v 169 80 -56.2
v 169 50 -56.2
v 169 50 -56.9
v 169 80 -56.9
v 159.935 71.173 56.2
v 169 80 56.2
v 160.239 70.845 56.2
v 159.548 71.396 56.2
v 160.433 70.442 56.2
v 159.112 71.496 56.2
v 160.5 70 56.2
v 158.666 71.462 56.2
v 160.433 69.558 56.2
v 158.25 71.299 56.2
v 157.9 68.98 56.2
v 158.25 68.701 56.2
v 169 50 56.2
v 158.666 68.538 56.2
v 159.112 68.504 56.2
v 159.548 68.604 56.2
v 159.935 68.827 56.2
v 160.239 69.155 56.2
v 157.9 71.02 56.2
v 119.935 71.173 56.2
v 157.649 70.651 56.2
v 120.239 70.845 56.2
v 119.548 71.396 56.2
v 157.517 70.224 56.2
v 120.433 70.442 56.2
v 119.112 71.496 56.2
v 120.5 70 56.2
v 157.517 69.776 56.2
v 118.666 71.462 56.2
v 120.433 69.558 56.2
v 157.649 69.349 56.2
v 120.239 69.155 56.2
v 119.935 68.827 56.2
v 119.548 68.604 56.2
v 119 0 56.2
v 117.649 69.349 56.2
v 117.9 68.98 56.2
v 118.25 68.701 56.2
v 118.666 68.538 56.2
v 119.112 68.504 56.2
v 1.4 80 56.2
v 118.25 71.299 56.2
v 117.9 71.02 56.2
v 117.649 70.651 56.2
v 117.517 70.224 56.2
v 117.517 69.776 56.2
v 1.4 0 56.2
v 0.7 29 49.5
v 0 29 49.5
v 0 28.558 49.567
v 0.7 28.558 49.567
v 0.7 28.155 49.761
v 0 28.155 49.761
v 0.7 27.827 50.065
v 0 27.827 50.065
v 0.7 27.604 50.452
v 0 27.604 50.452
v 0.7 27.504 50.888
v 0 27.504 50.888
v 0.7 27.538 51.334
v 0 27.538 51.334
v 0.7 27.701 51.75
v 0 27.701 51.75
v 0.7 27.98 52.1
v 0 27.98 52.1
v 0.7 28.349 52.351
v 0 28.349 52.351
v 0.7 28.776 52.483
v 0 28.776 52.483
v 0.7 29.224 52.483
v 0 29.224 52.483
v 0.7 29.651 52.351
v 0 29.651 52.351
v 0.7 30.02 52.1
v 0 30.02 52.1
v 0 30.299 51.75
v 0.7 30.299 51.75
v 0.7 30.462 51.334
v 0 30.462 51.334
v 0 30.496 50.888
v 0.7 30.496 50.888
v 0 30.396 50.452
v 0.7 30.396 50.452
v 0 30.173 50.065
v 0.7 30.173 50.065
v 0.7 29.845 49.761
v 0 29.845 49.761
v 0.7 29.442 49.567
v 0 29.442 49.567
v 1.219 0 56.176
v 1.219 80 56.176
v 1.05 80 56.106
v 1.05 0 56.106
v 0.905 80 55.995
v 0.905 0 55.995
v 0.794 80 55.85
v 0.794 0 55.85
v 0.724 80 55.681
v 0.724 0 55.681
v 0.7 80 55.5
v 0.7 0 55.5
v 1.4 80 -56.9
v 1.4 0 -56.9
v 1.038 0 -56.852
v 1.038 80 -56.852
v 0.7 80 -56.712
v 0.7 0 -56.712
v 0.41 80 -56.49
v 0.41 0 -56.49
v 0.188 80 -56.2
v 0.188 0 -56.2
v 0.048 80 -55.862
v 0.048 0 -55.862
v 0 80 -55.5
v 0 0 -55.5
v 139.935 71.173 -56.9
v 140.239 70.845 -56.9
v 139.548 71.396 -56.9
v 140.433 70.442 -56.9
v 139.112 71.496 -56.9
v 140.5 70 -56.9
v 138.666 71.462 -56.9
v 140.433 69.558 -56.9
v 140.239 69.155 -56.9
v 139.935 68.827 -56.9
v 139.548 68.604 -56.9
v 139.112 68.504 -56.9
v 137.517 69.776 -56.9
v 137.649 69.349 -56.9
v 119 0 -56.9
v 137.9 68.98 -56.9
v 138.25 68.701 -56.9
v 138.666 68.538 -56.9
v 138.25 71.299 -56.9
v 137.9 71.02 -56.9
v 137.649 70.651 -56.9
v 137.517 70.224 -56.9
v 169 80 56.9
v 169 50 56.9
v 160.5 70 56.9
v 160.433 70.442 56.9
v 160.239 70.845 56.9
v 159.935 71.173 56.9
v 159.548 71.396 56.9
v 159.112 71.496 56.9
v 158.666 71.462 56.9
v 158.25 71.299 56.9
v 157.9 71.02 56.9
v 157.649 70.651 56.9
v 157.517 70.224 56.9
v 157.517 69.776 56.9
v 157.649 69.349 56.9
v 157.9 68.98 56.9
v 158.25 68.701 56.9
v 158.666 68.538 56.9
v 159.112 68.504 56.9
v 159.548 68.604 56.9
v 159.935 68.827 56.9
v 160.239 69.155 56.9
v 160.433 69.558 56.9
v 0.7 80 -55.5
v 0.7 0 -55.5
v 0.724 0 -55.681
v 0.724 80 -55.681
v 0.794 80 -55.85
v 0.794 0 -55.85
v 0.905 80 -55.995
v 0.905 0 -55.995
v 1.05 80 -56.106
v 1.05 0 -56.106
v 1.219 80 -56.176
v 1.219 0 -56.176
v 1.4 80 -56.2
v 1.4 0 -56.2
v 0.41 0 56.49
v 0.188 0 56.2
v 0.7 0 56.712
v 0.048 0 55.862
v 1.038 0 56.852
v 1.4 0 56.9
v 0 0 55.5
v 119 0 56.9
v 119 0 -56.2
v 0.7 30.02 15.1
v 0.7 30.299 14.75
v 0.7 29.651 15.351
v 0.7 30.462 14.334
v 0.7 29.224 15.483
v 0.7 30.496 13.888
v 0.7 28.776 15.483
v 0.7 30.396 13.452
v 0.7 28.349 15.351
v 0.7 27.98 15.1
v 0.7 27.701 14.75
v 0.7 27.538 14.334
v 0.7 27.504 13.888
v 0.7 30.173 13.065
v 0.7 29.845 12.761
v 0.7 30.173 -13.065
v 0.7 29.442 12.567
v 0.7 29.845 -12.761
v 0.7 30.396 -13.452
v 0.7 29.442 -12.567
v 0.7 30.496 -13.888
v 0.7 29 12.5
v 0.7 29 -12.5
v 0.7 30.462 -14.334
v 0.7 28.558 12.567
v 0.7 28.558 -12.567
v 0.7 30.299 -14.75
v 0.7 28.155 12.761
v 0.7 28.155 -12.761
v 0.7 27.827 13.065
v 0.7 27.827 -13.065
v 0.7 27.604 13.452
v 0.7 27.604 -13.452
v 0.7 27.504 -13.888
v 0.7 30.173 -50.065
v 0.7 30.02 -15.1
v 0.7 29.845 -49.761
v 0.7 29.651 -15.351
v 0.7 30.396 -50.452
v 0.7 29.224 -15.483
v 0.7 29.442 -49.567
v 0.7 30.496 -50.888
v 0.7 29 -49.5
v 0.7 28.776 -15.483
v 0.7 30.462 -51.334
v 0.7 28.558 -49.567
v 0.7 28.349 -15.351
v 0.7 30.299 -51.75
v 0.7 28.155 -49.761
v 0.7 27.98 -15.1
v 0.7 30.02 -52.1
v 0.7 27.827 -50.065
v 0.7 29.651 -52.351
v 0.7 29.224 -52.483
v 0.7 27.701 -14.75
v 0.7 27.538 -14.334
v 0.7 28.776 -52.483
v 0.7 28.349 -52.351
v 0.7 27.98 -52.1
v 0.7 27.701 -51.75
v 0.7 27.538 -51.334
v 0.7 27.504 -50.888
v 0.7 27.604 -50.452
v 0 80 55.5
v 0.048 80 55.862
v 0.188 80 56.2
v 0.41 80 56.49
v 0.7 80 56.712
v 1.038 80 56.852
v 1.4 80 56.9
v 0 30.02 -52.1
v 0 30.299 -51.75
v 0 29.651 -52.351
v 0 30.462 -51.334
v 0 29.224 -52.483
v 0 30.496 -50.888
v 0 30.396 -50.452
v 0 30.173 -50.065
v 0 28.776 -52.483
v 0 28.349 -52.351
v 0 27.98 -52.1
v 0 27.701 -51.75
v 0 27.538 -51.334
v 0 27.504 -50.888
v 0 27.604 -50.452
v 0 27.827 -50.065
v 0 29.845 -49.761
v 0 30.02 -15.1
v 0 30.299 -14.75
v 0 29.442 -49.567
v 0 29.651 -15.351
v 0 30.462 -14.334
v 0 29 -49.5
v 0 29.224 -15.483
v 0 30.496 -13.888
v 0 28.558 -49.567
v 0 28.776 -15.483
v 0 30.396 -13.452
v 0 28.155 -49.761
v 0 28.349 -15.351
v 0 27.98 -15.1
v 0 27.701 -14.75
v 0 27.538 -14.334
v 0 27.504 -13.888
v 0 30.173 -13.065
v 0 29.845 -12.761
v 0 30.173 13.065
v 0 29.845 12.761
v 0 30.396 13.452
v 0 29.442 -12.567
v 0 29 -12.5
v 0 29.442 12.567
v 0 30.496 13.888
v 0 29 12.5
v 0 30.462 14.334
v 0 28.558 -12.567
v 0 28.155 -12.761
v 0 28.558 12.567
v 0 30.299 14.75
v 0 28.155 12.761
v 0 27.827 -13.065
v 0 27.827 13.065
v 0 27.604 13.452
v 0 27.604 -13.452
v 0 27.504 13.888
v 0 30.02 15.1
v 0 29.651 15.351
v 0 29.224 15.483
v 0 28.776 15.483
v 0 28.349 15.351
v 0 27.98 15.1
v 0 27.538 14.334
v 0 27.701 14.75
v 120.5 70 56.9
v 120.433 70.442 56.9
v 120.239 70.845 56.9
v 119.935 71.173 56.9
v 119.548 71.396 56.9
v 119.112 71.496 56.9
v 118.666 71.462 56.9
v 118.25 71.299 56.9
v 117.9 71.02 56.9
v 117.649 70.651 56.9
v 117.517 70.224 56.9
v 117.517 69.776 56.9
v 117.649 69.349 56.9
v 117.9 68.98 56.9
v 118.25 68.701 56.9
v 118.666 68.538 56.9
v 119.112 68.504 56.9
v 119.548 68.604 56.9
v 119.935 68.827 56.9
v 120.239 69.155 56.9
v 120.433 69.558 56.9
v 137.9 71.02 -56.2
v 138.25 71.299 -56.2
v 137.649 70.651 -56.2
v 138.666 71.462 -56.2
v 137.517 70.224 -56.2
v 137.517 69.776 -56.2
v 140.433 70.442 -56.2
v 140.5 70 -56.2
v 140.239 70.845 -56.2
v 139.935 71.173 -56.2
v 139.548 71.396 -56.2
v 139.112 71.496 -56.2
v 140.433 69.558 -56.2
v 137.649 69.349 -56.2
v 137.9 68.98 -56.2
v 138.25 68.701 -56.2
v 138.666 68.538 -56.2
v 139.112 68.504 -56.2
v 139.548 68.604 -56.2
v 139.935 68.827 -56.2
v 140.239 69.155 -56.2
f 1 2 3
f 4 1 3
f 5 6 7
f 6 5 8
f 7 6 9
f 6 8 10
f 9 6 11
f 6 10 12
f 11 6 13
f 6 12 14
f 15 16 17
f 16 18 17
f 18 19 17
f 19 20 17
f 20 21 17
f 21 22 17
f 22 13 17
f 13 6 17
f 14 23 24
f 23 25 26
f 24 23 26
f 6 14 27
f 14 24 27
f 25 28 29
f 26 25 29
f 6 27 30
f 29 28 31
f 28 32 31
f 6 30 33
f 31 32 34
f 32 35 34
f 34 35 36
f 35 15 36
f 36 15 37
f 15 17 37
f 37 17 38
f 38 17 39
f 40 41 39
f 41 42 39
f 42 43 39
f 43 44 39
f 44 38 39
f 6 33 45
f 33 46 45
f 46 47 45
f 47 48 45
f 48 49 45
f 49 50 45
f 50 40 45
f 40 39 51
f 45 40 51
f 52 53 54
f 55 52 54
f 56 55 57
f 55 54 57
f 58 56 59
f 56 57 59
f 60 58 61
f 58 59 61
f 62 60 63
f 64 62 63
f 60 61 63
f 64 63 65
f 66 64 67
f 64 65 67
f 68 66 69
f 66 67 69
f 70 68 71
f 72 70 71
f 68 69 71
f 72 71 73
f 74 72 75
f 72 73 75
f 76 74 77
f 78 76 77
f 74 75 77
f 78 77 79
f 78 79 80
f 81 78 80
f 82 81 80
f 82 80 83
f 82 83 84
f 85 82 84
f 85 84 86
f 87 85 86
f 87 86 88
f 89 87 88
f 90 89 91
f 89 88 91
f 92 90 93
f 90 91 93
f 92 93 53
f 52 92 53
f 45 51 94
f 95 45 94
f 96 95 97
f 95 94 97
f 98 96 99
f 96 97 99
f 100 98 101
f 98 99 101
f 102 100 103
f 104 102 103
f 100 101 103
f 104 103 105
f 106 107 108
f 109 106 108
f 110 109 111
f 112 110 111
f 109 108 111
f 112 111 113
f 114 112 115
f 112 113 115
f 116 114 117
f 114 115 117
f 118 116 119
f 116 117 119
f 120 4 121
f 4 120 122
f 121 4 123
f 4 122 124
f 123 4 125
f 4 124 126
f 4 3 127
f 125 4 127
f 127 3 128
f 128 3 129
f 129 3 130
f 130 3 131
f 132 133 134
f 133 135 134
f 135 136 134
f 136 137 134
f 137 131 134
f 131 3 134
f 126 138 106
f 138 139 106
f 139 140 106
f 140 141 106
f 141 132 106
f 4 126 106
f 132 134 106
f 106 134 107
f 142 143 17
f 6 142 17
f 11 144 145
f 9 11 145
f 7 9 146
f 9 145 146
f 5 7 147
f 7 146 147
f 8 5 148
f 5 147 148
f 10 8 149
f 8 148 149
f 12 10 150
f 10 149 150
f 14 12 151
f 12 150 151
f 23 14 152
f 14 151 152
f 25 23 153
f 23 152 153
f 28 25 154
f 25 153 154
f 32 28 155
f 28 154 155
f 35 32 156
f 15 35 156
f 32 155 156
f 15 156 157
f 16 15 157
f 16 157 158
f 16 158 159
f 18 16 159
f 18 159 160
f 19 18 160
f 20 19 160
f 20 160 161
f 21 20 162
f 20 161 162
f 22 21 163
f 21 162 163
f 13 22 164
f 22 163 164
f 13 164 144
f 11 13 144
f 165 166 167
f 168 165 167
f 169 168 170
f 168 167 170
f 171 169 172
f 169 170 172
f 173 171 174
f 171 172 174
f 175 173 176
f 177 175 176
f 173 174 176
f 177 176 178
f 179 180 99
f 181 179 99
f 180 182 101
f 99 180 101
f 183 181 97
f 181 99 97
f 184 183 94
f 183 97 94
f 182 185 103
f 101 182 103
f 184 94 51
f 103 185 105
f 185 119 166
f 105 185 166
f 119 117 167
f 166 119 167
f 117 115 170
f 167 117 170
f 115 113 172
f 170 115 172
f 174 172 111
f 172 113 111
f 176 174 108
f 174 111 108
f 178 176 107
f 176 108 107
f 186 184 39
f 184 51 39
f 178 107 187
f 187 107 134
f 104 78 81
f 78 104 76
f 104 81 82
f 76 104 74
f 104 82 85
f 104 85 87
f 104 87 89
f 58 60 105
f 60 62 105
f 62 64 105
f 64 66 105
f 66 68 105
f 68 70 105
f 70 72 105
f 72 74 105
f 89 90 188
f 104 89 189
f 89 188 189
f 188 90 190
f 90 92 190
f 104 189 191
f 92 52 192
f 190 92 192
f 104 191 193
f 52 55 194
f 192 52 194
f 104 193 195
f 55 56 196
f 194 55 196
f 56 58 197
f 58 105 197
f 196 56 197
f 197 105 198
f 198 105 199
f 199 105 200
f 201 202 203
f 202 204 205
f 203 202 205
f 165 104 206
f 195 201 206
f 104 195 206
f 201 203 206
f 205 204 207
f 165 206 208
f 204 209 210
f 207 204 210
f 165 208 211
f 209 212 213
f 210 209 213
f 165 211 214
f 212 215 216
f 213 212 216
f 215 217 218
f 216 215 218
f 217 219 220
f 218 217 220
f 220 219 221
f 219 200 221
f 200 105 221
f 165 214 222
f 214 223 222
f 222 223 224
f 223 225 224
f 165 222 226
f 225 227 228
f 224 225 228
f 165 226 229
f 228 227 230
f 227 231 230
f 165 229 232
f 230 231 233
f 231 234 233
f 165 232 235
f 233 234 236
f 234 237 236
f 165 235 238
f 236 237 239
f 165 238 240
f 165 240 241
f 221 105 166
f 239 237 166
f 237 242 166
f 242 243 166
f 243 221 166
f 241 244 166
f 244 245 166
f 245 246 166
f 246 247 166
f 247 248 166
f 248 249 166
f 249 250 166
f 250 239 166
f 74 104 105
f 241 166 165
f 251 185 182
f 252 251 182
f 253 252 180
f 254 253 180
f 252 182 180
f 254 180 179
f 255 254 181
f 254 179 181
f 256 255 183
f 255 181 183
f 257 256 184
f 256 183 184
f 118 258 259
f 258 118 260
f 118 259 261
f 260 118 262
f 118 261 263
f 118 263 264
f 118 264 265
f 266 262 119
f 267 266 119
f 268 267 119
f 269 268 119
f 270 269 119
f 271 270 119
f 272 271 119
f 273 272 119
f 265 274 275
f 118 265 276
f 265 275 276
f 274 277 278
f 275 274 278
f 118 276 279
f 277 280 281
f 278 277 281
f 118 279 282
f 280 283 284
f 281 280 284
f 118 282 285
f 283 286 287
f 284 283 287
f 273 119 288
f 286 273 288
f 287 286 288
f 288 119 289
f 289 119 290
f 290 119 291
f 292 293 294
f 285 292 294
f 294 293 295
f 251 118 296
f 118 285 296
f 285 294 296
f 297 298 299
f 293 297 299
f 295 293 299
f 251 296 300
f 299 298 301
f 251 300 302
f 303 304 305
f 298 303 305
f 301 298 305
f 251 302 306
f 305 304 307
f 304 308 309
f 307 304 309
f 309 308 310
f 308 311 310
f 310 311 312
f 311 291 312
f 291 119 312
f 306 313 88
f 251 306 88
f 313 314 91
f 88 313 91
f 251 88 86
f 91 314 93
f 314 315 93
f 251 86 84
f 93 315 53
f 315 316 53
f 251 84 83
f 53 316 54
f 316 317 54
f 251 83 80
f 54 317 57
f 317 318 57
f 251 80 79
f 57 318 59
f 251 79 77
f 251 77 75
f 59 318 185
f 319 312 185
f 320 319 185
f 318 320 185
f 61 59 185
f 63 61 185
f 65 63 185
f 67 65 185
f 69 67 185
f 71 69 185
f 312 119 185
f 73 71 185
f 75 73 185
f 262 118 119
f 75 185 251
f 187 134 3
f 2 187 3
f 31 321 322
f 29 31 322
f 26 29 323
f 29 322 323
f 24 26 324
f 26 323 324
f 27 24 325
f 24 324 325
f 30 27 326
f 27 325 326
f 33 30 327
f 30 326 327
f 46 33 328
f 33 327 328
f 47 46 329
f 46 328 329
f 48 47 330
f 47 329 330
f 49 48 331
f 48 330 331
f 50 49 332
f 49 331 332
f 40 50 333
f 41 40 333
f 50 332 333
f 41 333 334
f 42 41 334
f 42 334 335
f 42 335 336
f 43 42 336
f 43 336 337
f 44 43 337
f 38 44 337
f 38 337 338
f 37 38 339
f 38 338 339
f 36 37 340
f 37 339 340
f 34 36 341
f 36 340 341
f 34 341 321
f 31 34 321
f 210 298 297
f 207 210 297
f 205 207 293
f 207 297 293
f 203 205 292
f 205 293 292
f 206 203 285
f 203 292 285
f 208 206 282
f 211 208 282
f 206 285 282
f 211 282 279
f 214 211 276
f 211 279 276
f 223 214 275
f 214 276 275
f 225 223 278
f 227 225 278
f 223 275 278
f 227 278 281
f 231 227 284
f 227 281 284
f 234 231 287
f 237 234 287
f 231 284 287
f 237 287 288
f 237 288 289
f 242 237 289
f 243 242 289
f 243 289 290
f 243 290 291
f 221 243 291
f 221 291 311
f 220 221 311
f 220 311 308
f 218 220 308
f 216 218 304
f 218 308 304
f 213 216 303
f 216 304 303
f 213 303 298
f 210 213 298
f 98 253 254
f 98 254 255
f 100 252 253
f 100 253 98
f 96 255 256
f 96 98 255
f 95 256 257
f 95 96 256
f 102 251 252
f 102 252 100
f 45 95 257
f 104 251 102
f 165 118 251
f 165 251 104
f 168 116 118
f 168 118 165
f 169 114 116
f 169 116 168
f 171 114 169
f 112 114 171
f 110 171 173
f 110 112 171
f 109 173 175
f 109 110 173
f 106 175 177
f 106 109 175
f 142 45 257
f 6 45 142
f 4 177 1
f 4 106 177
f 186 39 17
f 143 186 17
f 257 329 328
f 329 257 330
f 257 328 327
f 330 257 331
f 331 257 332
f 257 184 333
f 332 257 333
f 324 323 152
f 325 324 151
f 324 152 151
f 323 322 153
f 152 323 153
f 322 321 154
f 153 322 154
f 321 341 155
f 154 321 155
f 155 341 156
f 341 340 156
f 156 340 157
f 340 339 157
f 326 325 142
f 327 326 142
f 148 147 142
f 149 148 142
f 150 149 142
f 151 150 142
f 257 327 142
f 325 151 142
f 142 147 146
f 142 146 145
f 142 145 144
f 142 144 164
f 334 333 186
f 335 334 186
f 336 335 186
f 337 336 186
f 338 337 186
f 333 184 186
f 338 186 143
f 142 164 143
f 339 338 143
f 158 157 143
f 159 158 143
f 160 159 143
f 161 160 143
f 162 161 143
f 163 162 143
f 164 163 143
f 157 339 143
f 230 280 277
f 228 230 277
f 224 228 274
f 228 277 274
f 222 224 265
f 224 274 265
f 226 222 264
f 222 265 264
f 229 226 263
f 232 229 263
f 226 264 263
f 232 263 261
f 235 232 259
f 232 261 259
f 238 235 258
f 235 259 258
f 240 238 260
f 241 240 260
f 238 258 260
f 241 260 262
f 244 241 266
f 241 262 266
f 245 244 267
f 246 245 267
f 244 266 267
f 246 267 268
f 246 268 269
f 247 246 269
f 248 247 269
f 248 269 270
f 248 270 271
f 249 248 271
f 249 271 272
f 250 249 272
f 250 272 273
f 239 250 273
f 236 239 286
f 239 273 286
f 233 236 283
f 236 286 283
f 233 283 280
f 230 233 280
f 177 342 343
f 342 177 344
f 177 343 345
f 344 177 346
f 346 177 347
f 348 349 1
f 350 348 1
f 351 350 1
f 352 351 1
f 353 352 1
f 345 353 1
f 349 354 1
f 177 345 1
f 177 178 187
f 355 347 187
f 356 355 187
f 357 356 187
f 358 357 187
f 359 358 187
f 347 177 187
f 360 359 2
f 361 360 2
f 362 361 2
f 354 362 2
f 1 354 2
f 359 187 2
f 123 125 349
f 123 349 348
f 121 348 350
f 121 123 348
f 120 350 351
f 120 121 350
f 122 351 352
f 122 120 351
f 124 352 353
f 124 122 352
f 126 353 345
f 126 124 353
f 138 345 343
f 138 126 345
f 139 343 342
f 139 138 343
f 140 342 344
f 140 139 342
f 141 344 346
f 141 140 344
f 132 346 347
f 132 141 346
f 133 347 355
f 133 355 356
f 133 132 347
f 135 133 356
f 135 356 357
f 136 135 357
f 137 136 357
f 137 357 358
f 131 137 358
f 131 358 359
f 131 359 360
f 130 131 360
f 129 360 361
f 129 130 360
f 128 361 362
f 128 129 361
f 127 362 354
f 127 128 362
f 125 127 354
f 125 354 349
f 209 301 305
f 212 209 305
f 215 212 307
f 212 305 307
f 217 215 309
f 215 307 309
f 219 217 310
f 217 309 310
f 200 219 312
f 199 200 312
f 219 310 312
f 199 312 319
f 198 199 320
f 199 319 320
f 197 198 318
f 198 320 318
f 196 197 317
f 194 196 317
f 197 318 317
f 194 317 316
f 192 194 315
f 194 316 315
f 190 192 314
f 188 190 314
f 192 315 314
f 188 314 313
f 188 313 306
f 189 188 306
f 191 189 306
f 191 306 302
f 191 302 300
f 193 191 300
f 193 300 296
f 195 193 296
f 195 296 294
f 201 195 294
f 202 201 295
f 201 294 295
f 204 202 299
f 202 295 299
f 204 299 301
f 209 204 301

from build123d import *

# Parameters (mm, degrees)
BASE_FLANGE1_DEPTH      = 80
CUT_EXTRUDE1_DEPTH      = 219.886820069
CUT_EXTRUDE1_DEPTH_BACK = 219.886820069
SKETCH7_R               = 1.5
CUT_EXTRUDE3_DEPTH      = 0.7
SKETCH8_R               = 1.5
CUT_EXTRUDE4_DEPTH      = 0.7
SKETCH9_R               = 1.5
CUT_EXTRUDE5_DEPTH      = 0.7


# Sheet-metal steps are written as plain solids
with BuildPart() as part:
    # Sketch1 → Base-Flange1 (new body)
    with BuildSketch(Plane(origin=(0, 0, 0), x_dir=(1, 0, 0), z_dir=(0, 1, 0))):
        with BuildLine():
            Line((169, 56.9), (1.4, 56.9))
            ThreePointArc((1.4, 56.9), (0.410050506, 56.489949494), (0, 55.5))
            Line((0, 55.5), (0, 0))
            Line((0, 0), (0, -55.5))
            ThreePointArc((0, -55.5), (0.410050506, -56.489949494), (1.4, -56.9))
            Line((1.4, -56.9), (169, -56.9))
            Line((169, -56.9), (169, -56.2))
            Line((169, -56.2), (1.4, -56.2))
            ThreePointArc((1.4, -56.2), (0.905025253, -55.994974747), (0.7, -55.5))
            Line((0.7, -55.5), (0.7, 0))
            Line((0.7, 0), (0.7, 55.5))
            ThreePointArc((0.7, 55.5), (0.905025253, 55.994974747), (1.4, 56.2))
            Line((1.4, 56.2), (169, 56.2))
            Line((169, 56.2), (169, 56.9))
        make_face()
    extrude(amount=BASE_FLANGE1_DEPTH)

    # Sketch6 → Cut-Extrude1 (cut, two sides: drawn at the far end of the back side and taken through both)
    with BuildSketch(Plane.XY.offset(56.9).offset(-CUT_EXTRUDE1_DEPTH_BACK)):
        Polygon((169, 50), (169, 0), (119, 0), align=None)
    extrude(amount=CUT_EXTRUDE1_DEPTH + CUT_EXTRUDE1_DEPTH_BACK, mode=Mode.SUBTRACT)

    # Sketch7 → Cut-Extrude3 (cut)
    with BuildSketch(Plane.XY.offset(56.9)):
        with Locations((159, 70)):
            Circle(SKETCH7_R)
        with Locations((119, 70)):
            Circle(SKETCH7_R)
    extrude(amount=-CUT_EXTRUDE3_DEPTH, mode=Mode.SUBTRACT)

    # Sketch8 → Cut-Extrude4 (cut)
    with BuildSketch(Plane.XY.offset(-56.9)):
        with Locations((139, 70)):
            Circle(SKETCH8_R)
    extrude(amount=CUT_EXTRUDE4_DEPTH, mode=Mode.SUBTRACT)

    # Sketch9 → Cut-Extrude5 (cut)
    with BuildSketch(Plane.ZY):
        with Locations((-51, 29)):
            Circle(SKETCH9_R)
        with Locations((-14, 29)):
            Circle(SKETCH9_R)
        with Locations(Location((14, 29, 0), (0, 0, 180))):
            Circle(SKETCH9_R)
        with Locations(Location((51, 29, 0), (0, 0, 180))):
            Circle(SKETCH9_R)
    extrude(amount=-CUT_EXTRUDE5_DEPTH, mode=Mode.SUBTRACT)


solid = part.part
